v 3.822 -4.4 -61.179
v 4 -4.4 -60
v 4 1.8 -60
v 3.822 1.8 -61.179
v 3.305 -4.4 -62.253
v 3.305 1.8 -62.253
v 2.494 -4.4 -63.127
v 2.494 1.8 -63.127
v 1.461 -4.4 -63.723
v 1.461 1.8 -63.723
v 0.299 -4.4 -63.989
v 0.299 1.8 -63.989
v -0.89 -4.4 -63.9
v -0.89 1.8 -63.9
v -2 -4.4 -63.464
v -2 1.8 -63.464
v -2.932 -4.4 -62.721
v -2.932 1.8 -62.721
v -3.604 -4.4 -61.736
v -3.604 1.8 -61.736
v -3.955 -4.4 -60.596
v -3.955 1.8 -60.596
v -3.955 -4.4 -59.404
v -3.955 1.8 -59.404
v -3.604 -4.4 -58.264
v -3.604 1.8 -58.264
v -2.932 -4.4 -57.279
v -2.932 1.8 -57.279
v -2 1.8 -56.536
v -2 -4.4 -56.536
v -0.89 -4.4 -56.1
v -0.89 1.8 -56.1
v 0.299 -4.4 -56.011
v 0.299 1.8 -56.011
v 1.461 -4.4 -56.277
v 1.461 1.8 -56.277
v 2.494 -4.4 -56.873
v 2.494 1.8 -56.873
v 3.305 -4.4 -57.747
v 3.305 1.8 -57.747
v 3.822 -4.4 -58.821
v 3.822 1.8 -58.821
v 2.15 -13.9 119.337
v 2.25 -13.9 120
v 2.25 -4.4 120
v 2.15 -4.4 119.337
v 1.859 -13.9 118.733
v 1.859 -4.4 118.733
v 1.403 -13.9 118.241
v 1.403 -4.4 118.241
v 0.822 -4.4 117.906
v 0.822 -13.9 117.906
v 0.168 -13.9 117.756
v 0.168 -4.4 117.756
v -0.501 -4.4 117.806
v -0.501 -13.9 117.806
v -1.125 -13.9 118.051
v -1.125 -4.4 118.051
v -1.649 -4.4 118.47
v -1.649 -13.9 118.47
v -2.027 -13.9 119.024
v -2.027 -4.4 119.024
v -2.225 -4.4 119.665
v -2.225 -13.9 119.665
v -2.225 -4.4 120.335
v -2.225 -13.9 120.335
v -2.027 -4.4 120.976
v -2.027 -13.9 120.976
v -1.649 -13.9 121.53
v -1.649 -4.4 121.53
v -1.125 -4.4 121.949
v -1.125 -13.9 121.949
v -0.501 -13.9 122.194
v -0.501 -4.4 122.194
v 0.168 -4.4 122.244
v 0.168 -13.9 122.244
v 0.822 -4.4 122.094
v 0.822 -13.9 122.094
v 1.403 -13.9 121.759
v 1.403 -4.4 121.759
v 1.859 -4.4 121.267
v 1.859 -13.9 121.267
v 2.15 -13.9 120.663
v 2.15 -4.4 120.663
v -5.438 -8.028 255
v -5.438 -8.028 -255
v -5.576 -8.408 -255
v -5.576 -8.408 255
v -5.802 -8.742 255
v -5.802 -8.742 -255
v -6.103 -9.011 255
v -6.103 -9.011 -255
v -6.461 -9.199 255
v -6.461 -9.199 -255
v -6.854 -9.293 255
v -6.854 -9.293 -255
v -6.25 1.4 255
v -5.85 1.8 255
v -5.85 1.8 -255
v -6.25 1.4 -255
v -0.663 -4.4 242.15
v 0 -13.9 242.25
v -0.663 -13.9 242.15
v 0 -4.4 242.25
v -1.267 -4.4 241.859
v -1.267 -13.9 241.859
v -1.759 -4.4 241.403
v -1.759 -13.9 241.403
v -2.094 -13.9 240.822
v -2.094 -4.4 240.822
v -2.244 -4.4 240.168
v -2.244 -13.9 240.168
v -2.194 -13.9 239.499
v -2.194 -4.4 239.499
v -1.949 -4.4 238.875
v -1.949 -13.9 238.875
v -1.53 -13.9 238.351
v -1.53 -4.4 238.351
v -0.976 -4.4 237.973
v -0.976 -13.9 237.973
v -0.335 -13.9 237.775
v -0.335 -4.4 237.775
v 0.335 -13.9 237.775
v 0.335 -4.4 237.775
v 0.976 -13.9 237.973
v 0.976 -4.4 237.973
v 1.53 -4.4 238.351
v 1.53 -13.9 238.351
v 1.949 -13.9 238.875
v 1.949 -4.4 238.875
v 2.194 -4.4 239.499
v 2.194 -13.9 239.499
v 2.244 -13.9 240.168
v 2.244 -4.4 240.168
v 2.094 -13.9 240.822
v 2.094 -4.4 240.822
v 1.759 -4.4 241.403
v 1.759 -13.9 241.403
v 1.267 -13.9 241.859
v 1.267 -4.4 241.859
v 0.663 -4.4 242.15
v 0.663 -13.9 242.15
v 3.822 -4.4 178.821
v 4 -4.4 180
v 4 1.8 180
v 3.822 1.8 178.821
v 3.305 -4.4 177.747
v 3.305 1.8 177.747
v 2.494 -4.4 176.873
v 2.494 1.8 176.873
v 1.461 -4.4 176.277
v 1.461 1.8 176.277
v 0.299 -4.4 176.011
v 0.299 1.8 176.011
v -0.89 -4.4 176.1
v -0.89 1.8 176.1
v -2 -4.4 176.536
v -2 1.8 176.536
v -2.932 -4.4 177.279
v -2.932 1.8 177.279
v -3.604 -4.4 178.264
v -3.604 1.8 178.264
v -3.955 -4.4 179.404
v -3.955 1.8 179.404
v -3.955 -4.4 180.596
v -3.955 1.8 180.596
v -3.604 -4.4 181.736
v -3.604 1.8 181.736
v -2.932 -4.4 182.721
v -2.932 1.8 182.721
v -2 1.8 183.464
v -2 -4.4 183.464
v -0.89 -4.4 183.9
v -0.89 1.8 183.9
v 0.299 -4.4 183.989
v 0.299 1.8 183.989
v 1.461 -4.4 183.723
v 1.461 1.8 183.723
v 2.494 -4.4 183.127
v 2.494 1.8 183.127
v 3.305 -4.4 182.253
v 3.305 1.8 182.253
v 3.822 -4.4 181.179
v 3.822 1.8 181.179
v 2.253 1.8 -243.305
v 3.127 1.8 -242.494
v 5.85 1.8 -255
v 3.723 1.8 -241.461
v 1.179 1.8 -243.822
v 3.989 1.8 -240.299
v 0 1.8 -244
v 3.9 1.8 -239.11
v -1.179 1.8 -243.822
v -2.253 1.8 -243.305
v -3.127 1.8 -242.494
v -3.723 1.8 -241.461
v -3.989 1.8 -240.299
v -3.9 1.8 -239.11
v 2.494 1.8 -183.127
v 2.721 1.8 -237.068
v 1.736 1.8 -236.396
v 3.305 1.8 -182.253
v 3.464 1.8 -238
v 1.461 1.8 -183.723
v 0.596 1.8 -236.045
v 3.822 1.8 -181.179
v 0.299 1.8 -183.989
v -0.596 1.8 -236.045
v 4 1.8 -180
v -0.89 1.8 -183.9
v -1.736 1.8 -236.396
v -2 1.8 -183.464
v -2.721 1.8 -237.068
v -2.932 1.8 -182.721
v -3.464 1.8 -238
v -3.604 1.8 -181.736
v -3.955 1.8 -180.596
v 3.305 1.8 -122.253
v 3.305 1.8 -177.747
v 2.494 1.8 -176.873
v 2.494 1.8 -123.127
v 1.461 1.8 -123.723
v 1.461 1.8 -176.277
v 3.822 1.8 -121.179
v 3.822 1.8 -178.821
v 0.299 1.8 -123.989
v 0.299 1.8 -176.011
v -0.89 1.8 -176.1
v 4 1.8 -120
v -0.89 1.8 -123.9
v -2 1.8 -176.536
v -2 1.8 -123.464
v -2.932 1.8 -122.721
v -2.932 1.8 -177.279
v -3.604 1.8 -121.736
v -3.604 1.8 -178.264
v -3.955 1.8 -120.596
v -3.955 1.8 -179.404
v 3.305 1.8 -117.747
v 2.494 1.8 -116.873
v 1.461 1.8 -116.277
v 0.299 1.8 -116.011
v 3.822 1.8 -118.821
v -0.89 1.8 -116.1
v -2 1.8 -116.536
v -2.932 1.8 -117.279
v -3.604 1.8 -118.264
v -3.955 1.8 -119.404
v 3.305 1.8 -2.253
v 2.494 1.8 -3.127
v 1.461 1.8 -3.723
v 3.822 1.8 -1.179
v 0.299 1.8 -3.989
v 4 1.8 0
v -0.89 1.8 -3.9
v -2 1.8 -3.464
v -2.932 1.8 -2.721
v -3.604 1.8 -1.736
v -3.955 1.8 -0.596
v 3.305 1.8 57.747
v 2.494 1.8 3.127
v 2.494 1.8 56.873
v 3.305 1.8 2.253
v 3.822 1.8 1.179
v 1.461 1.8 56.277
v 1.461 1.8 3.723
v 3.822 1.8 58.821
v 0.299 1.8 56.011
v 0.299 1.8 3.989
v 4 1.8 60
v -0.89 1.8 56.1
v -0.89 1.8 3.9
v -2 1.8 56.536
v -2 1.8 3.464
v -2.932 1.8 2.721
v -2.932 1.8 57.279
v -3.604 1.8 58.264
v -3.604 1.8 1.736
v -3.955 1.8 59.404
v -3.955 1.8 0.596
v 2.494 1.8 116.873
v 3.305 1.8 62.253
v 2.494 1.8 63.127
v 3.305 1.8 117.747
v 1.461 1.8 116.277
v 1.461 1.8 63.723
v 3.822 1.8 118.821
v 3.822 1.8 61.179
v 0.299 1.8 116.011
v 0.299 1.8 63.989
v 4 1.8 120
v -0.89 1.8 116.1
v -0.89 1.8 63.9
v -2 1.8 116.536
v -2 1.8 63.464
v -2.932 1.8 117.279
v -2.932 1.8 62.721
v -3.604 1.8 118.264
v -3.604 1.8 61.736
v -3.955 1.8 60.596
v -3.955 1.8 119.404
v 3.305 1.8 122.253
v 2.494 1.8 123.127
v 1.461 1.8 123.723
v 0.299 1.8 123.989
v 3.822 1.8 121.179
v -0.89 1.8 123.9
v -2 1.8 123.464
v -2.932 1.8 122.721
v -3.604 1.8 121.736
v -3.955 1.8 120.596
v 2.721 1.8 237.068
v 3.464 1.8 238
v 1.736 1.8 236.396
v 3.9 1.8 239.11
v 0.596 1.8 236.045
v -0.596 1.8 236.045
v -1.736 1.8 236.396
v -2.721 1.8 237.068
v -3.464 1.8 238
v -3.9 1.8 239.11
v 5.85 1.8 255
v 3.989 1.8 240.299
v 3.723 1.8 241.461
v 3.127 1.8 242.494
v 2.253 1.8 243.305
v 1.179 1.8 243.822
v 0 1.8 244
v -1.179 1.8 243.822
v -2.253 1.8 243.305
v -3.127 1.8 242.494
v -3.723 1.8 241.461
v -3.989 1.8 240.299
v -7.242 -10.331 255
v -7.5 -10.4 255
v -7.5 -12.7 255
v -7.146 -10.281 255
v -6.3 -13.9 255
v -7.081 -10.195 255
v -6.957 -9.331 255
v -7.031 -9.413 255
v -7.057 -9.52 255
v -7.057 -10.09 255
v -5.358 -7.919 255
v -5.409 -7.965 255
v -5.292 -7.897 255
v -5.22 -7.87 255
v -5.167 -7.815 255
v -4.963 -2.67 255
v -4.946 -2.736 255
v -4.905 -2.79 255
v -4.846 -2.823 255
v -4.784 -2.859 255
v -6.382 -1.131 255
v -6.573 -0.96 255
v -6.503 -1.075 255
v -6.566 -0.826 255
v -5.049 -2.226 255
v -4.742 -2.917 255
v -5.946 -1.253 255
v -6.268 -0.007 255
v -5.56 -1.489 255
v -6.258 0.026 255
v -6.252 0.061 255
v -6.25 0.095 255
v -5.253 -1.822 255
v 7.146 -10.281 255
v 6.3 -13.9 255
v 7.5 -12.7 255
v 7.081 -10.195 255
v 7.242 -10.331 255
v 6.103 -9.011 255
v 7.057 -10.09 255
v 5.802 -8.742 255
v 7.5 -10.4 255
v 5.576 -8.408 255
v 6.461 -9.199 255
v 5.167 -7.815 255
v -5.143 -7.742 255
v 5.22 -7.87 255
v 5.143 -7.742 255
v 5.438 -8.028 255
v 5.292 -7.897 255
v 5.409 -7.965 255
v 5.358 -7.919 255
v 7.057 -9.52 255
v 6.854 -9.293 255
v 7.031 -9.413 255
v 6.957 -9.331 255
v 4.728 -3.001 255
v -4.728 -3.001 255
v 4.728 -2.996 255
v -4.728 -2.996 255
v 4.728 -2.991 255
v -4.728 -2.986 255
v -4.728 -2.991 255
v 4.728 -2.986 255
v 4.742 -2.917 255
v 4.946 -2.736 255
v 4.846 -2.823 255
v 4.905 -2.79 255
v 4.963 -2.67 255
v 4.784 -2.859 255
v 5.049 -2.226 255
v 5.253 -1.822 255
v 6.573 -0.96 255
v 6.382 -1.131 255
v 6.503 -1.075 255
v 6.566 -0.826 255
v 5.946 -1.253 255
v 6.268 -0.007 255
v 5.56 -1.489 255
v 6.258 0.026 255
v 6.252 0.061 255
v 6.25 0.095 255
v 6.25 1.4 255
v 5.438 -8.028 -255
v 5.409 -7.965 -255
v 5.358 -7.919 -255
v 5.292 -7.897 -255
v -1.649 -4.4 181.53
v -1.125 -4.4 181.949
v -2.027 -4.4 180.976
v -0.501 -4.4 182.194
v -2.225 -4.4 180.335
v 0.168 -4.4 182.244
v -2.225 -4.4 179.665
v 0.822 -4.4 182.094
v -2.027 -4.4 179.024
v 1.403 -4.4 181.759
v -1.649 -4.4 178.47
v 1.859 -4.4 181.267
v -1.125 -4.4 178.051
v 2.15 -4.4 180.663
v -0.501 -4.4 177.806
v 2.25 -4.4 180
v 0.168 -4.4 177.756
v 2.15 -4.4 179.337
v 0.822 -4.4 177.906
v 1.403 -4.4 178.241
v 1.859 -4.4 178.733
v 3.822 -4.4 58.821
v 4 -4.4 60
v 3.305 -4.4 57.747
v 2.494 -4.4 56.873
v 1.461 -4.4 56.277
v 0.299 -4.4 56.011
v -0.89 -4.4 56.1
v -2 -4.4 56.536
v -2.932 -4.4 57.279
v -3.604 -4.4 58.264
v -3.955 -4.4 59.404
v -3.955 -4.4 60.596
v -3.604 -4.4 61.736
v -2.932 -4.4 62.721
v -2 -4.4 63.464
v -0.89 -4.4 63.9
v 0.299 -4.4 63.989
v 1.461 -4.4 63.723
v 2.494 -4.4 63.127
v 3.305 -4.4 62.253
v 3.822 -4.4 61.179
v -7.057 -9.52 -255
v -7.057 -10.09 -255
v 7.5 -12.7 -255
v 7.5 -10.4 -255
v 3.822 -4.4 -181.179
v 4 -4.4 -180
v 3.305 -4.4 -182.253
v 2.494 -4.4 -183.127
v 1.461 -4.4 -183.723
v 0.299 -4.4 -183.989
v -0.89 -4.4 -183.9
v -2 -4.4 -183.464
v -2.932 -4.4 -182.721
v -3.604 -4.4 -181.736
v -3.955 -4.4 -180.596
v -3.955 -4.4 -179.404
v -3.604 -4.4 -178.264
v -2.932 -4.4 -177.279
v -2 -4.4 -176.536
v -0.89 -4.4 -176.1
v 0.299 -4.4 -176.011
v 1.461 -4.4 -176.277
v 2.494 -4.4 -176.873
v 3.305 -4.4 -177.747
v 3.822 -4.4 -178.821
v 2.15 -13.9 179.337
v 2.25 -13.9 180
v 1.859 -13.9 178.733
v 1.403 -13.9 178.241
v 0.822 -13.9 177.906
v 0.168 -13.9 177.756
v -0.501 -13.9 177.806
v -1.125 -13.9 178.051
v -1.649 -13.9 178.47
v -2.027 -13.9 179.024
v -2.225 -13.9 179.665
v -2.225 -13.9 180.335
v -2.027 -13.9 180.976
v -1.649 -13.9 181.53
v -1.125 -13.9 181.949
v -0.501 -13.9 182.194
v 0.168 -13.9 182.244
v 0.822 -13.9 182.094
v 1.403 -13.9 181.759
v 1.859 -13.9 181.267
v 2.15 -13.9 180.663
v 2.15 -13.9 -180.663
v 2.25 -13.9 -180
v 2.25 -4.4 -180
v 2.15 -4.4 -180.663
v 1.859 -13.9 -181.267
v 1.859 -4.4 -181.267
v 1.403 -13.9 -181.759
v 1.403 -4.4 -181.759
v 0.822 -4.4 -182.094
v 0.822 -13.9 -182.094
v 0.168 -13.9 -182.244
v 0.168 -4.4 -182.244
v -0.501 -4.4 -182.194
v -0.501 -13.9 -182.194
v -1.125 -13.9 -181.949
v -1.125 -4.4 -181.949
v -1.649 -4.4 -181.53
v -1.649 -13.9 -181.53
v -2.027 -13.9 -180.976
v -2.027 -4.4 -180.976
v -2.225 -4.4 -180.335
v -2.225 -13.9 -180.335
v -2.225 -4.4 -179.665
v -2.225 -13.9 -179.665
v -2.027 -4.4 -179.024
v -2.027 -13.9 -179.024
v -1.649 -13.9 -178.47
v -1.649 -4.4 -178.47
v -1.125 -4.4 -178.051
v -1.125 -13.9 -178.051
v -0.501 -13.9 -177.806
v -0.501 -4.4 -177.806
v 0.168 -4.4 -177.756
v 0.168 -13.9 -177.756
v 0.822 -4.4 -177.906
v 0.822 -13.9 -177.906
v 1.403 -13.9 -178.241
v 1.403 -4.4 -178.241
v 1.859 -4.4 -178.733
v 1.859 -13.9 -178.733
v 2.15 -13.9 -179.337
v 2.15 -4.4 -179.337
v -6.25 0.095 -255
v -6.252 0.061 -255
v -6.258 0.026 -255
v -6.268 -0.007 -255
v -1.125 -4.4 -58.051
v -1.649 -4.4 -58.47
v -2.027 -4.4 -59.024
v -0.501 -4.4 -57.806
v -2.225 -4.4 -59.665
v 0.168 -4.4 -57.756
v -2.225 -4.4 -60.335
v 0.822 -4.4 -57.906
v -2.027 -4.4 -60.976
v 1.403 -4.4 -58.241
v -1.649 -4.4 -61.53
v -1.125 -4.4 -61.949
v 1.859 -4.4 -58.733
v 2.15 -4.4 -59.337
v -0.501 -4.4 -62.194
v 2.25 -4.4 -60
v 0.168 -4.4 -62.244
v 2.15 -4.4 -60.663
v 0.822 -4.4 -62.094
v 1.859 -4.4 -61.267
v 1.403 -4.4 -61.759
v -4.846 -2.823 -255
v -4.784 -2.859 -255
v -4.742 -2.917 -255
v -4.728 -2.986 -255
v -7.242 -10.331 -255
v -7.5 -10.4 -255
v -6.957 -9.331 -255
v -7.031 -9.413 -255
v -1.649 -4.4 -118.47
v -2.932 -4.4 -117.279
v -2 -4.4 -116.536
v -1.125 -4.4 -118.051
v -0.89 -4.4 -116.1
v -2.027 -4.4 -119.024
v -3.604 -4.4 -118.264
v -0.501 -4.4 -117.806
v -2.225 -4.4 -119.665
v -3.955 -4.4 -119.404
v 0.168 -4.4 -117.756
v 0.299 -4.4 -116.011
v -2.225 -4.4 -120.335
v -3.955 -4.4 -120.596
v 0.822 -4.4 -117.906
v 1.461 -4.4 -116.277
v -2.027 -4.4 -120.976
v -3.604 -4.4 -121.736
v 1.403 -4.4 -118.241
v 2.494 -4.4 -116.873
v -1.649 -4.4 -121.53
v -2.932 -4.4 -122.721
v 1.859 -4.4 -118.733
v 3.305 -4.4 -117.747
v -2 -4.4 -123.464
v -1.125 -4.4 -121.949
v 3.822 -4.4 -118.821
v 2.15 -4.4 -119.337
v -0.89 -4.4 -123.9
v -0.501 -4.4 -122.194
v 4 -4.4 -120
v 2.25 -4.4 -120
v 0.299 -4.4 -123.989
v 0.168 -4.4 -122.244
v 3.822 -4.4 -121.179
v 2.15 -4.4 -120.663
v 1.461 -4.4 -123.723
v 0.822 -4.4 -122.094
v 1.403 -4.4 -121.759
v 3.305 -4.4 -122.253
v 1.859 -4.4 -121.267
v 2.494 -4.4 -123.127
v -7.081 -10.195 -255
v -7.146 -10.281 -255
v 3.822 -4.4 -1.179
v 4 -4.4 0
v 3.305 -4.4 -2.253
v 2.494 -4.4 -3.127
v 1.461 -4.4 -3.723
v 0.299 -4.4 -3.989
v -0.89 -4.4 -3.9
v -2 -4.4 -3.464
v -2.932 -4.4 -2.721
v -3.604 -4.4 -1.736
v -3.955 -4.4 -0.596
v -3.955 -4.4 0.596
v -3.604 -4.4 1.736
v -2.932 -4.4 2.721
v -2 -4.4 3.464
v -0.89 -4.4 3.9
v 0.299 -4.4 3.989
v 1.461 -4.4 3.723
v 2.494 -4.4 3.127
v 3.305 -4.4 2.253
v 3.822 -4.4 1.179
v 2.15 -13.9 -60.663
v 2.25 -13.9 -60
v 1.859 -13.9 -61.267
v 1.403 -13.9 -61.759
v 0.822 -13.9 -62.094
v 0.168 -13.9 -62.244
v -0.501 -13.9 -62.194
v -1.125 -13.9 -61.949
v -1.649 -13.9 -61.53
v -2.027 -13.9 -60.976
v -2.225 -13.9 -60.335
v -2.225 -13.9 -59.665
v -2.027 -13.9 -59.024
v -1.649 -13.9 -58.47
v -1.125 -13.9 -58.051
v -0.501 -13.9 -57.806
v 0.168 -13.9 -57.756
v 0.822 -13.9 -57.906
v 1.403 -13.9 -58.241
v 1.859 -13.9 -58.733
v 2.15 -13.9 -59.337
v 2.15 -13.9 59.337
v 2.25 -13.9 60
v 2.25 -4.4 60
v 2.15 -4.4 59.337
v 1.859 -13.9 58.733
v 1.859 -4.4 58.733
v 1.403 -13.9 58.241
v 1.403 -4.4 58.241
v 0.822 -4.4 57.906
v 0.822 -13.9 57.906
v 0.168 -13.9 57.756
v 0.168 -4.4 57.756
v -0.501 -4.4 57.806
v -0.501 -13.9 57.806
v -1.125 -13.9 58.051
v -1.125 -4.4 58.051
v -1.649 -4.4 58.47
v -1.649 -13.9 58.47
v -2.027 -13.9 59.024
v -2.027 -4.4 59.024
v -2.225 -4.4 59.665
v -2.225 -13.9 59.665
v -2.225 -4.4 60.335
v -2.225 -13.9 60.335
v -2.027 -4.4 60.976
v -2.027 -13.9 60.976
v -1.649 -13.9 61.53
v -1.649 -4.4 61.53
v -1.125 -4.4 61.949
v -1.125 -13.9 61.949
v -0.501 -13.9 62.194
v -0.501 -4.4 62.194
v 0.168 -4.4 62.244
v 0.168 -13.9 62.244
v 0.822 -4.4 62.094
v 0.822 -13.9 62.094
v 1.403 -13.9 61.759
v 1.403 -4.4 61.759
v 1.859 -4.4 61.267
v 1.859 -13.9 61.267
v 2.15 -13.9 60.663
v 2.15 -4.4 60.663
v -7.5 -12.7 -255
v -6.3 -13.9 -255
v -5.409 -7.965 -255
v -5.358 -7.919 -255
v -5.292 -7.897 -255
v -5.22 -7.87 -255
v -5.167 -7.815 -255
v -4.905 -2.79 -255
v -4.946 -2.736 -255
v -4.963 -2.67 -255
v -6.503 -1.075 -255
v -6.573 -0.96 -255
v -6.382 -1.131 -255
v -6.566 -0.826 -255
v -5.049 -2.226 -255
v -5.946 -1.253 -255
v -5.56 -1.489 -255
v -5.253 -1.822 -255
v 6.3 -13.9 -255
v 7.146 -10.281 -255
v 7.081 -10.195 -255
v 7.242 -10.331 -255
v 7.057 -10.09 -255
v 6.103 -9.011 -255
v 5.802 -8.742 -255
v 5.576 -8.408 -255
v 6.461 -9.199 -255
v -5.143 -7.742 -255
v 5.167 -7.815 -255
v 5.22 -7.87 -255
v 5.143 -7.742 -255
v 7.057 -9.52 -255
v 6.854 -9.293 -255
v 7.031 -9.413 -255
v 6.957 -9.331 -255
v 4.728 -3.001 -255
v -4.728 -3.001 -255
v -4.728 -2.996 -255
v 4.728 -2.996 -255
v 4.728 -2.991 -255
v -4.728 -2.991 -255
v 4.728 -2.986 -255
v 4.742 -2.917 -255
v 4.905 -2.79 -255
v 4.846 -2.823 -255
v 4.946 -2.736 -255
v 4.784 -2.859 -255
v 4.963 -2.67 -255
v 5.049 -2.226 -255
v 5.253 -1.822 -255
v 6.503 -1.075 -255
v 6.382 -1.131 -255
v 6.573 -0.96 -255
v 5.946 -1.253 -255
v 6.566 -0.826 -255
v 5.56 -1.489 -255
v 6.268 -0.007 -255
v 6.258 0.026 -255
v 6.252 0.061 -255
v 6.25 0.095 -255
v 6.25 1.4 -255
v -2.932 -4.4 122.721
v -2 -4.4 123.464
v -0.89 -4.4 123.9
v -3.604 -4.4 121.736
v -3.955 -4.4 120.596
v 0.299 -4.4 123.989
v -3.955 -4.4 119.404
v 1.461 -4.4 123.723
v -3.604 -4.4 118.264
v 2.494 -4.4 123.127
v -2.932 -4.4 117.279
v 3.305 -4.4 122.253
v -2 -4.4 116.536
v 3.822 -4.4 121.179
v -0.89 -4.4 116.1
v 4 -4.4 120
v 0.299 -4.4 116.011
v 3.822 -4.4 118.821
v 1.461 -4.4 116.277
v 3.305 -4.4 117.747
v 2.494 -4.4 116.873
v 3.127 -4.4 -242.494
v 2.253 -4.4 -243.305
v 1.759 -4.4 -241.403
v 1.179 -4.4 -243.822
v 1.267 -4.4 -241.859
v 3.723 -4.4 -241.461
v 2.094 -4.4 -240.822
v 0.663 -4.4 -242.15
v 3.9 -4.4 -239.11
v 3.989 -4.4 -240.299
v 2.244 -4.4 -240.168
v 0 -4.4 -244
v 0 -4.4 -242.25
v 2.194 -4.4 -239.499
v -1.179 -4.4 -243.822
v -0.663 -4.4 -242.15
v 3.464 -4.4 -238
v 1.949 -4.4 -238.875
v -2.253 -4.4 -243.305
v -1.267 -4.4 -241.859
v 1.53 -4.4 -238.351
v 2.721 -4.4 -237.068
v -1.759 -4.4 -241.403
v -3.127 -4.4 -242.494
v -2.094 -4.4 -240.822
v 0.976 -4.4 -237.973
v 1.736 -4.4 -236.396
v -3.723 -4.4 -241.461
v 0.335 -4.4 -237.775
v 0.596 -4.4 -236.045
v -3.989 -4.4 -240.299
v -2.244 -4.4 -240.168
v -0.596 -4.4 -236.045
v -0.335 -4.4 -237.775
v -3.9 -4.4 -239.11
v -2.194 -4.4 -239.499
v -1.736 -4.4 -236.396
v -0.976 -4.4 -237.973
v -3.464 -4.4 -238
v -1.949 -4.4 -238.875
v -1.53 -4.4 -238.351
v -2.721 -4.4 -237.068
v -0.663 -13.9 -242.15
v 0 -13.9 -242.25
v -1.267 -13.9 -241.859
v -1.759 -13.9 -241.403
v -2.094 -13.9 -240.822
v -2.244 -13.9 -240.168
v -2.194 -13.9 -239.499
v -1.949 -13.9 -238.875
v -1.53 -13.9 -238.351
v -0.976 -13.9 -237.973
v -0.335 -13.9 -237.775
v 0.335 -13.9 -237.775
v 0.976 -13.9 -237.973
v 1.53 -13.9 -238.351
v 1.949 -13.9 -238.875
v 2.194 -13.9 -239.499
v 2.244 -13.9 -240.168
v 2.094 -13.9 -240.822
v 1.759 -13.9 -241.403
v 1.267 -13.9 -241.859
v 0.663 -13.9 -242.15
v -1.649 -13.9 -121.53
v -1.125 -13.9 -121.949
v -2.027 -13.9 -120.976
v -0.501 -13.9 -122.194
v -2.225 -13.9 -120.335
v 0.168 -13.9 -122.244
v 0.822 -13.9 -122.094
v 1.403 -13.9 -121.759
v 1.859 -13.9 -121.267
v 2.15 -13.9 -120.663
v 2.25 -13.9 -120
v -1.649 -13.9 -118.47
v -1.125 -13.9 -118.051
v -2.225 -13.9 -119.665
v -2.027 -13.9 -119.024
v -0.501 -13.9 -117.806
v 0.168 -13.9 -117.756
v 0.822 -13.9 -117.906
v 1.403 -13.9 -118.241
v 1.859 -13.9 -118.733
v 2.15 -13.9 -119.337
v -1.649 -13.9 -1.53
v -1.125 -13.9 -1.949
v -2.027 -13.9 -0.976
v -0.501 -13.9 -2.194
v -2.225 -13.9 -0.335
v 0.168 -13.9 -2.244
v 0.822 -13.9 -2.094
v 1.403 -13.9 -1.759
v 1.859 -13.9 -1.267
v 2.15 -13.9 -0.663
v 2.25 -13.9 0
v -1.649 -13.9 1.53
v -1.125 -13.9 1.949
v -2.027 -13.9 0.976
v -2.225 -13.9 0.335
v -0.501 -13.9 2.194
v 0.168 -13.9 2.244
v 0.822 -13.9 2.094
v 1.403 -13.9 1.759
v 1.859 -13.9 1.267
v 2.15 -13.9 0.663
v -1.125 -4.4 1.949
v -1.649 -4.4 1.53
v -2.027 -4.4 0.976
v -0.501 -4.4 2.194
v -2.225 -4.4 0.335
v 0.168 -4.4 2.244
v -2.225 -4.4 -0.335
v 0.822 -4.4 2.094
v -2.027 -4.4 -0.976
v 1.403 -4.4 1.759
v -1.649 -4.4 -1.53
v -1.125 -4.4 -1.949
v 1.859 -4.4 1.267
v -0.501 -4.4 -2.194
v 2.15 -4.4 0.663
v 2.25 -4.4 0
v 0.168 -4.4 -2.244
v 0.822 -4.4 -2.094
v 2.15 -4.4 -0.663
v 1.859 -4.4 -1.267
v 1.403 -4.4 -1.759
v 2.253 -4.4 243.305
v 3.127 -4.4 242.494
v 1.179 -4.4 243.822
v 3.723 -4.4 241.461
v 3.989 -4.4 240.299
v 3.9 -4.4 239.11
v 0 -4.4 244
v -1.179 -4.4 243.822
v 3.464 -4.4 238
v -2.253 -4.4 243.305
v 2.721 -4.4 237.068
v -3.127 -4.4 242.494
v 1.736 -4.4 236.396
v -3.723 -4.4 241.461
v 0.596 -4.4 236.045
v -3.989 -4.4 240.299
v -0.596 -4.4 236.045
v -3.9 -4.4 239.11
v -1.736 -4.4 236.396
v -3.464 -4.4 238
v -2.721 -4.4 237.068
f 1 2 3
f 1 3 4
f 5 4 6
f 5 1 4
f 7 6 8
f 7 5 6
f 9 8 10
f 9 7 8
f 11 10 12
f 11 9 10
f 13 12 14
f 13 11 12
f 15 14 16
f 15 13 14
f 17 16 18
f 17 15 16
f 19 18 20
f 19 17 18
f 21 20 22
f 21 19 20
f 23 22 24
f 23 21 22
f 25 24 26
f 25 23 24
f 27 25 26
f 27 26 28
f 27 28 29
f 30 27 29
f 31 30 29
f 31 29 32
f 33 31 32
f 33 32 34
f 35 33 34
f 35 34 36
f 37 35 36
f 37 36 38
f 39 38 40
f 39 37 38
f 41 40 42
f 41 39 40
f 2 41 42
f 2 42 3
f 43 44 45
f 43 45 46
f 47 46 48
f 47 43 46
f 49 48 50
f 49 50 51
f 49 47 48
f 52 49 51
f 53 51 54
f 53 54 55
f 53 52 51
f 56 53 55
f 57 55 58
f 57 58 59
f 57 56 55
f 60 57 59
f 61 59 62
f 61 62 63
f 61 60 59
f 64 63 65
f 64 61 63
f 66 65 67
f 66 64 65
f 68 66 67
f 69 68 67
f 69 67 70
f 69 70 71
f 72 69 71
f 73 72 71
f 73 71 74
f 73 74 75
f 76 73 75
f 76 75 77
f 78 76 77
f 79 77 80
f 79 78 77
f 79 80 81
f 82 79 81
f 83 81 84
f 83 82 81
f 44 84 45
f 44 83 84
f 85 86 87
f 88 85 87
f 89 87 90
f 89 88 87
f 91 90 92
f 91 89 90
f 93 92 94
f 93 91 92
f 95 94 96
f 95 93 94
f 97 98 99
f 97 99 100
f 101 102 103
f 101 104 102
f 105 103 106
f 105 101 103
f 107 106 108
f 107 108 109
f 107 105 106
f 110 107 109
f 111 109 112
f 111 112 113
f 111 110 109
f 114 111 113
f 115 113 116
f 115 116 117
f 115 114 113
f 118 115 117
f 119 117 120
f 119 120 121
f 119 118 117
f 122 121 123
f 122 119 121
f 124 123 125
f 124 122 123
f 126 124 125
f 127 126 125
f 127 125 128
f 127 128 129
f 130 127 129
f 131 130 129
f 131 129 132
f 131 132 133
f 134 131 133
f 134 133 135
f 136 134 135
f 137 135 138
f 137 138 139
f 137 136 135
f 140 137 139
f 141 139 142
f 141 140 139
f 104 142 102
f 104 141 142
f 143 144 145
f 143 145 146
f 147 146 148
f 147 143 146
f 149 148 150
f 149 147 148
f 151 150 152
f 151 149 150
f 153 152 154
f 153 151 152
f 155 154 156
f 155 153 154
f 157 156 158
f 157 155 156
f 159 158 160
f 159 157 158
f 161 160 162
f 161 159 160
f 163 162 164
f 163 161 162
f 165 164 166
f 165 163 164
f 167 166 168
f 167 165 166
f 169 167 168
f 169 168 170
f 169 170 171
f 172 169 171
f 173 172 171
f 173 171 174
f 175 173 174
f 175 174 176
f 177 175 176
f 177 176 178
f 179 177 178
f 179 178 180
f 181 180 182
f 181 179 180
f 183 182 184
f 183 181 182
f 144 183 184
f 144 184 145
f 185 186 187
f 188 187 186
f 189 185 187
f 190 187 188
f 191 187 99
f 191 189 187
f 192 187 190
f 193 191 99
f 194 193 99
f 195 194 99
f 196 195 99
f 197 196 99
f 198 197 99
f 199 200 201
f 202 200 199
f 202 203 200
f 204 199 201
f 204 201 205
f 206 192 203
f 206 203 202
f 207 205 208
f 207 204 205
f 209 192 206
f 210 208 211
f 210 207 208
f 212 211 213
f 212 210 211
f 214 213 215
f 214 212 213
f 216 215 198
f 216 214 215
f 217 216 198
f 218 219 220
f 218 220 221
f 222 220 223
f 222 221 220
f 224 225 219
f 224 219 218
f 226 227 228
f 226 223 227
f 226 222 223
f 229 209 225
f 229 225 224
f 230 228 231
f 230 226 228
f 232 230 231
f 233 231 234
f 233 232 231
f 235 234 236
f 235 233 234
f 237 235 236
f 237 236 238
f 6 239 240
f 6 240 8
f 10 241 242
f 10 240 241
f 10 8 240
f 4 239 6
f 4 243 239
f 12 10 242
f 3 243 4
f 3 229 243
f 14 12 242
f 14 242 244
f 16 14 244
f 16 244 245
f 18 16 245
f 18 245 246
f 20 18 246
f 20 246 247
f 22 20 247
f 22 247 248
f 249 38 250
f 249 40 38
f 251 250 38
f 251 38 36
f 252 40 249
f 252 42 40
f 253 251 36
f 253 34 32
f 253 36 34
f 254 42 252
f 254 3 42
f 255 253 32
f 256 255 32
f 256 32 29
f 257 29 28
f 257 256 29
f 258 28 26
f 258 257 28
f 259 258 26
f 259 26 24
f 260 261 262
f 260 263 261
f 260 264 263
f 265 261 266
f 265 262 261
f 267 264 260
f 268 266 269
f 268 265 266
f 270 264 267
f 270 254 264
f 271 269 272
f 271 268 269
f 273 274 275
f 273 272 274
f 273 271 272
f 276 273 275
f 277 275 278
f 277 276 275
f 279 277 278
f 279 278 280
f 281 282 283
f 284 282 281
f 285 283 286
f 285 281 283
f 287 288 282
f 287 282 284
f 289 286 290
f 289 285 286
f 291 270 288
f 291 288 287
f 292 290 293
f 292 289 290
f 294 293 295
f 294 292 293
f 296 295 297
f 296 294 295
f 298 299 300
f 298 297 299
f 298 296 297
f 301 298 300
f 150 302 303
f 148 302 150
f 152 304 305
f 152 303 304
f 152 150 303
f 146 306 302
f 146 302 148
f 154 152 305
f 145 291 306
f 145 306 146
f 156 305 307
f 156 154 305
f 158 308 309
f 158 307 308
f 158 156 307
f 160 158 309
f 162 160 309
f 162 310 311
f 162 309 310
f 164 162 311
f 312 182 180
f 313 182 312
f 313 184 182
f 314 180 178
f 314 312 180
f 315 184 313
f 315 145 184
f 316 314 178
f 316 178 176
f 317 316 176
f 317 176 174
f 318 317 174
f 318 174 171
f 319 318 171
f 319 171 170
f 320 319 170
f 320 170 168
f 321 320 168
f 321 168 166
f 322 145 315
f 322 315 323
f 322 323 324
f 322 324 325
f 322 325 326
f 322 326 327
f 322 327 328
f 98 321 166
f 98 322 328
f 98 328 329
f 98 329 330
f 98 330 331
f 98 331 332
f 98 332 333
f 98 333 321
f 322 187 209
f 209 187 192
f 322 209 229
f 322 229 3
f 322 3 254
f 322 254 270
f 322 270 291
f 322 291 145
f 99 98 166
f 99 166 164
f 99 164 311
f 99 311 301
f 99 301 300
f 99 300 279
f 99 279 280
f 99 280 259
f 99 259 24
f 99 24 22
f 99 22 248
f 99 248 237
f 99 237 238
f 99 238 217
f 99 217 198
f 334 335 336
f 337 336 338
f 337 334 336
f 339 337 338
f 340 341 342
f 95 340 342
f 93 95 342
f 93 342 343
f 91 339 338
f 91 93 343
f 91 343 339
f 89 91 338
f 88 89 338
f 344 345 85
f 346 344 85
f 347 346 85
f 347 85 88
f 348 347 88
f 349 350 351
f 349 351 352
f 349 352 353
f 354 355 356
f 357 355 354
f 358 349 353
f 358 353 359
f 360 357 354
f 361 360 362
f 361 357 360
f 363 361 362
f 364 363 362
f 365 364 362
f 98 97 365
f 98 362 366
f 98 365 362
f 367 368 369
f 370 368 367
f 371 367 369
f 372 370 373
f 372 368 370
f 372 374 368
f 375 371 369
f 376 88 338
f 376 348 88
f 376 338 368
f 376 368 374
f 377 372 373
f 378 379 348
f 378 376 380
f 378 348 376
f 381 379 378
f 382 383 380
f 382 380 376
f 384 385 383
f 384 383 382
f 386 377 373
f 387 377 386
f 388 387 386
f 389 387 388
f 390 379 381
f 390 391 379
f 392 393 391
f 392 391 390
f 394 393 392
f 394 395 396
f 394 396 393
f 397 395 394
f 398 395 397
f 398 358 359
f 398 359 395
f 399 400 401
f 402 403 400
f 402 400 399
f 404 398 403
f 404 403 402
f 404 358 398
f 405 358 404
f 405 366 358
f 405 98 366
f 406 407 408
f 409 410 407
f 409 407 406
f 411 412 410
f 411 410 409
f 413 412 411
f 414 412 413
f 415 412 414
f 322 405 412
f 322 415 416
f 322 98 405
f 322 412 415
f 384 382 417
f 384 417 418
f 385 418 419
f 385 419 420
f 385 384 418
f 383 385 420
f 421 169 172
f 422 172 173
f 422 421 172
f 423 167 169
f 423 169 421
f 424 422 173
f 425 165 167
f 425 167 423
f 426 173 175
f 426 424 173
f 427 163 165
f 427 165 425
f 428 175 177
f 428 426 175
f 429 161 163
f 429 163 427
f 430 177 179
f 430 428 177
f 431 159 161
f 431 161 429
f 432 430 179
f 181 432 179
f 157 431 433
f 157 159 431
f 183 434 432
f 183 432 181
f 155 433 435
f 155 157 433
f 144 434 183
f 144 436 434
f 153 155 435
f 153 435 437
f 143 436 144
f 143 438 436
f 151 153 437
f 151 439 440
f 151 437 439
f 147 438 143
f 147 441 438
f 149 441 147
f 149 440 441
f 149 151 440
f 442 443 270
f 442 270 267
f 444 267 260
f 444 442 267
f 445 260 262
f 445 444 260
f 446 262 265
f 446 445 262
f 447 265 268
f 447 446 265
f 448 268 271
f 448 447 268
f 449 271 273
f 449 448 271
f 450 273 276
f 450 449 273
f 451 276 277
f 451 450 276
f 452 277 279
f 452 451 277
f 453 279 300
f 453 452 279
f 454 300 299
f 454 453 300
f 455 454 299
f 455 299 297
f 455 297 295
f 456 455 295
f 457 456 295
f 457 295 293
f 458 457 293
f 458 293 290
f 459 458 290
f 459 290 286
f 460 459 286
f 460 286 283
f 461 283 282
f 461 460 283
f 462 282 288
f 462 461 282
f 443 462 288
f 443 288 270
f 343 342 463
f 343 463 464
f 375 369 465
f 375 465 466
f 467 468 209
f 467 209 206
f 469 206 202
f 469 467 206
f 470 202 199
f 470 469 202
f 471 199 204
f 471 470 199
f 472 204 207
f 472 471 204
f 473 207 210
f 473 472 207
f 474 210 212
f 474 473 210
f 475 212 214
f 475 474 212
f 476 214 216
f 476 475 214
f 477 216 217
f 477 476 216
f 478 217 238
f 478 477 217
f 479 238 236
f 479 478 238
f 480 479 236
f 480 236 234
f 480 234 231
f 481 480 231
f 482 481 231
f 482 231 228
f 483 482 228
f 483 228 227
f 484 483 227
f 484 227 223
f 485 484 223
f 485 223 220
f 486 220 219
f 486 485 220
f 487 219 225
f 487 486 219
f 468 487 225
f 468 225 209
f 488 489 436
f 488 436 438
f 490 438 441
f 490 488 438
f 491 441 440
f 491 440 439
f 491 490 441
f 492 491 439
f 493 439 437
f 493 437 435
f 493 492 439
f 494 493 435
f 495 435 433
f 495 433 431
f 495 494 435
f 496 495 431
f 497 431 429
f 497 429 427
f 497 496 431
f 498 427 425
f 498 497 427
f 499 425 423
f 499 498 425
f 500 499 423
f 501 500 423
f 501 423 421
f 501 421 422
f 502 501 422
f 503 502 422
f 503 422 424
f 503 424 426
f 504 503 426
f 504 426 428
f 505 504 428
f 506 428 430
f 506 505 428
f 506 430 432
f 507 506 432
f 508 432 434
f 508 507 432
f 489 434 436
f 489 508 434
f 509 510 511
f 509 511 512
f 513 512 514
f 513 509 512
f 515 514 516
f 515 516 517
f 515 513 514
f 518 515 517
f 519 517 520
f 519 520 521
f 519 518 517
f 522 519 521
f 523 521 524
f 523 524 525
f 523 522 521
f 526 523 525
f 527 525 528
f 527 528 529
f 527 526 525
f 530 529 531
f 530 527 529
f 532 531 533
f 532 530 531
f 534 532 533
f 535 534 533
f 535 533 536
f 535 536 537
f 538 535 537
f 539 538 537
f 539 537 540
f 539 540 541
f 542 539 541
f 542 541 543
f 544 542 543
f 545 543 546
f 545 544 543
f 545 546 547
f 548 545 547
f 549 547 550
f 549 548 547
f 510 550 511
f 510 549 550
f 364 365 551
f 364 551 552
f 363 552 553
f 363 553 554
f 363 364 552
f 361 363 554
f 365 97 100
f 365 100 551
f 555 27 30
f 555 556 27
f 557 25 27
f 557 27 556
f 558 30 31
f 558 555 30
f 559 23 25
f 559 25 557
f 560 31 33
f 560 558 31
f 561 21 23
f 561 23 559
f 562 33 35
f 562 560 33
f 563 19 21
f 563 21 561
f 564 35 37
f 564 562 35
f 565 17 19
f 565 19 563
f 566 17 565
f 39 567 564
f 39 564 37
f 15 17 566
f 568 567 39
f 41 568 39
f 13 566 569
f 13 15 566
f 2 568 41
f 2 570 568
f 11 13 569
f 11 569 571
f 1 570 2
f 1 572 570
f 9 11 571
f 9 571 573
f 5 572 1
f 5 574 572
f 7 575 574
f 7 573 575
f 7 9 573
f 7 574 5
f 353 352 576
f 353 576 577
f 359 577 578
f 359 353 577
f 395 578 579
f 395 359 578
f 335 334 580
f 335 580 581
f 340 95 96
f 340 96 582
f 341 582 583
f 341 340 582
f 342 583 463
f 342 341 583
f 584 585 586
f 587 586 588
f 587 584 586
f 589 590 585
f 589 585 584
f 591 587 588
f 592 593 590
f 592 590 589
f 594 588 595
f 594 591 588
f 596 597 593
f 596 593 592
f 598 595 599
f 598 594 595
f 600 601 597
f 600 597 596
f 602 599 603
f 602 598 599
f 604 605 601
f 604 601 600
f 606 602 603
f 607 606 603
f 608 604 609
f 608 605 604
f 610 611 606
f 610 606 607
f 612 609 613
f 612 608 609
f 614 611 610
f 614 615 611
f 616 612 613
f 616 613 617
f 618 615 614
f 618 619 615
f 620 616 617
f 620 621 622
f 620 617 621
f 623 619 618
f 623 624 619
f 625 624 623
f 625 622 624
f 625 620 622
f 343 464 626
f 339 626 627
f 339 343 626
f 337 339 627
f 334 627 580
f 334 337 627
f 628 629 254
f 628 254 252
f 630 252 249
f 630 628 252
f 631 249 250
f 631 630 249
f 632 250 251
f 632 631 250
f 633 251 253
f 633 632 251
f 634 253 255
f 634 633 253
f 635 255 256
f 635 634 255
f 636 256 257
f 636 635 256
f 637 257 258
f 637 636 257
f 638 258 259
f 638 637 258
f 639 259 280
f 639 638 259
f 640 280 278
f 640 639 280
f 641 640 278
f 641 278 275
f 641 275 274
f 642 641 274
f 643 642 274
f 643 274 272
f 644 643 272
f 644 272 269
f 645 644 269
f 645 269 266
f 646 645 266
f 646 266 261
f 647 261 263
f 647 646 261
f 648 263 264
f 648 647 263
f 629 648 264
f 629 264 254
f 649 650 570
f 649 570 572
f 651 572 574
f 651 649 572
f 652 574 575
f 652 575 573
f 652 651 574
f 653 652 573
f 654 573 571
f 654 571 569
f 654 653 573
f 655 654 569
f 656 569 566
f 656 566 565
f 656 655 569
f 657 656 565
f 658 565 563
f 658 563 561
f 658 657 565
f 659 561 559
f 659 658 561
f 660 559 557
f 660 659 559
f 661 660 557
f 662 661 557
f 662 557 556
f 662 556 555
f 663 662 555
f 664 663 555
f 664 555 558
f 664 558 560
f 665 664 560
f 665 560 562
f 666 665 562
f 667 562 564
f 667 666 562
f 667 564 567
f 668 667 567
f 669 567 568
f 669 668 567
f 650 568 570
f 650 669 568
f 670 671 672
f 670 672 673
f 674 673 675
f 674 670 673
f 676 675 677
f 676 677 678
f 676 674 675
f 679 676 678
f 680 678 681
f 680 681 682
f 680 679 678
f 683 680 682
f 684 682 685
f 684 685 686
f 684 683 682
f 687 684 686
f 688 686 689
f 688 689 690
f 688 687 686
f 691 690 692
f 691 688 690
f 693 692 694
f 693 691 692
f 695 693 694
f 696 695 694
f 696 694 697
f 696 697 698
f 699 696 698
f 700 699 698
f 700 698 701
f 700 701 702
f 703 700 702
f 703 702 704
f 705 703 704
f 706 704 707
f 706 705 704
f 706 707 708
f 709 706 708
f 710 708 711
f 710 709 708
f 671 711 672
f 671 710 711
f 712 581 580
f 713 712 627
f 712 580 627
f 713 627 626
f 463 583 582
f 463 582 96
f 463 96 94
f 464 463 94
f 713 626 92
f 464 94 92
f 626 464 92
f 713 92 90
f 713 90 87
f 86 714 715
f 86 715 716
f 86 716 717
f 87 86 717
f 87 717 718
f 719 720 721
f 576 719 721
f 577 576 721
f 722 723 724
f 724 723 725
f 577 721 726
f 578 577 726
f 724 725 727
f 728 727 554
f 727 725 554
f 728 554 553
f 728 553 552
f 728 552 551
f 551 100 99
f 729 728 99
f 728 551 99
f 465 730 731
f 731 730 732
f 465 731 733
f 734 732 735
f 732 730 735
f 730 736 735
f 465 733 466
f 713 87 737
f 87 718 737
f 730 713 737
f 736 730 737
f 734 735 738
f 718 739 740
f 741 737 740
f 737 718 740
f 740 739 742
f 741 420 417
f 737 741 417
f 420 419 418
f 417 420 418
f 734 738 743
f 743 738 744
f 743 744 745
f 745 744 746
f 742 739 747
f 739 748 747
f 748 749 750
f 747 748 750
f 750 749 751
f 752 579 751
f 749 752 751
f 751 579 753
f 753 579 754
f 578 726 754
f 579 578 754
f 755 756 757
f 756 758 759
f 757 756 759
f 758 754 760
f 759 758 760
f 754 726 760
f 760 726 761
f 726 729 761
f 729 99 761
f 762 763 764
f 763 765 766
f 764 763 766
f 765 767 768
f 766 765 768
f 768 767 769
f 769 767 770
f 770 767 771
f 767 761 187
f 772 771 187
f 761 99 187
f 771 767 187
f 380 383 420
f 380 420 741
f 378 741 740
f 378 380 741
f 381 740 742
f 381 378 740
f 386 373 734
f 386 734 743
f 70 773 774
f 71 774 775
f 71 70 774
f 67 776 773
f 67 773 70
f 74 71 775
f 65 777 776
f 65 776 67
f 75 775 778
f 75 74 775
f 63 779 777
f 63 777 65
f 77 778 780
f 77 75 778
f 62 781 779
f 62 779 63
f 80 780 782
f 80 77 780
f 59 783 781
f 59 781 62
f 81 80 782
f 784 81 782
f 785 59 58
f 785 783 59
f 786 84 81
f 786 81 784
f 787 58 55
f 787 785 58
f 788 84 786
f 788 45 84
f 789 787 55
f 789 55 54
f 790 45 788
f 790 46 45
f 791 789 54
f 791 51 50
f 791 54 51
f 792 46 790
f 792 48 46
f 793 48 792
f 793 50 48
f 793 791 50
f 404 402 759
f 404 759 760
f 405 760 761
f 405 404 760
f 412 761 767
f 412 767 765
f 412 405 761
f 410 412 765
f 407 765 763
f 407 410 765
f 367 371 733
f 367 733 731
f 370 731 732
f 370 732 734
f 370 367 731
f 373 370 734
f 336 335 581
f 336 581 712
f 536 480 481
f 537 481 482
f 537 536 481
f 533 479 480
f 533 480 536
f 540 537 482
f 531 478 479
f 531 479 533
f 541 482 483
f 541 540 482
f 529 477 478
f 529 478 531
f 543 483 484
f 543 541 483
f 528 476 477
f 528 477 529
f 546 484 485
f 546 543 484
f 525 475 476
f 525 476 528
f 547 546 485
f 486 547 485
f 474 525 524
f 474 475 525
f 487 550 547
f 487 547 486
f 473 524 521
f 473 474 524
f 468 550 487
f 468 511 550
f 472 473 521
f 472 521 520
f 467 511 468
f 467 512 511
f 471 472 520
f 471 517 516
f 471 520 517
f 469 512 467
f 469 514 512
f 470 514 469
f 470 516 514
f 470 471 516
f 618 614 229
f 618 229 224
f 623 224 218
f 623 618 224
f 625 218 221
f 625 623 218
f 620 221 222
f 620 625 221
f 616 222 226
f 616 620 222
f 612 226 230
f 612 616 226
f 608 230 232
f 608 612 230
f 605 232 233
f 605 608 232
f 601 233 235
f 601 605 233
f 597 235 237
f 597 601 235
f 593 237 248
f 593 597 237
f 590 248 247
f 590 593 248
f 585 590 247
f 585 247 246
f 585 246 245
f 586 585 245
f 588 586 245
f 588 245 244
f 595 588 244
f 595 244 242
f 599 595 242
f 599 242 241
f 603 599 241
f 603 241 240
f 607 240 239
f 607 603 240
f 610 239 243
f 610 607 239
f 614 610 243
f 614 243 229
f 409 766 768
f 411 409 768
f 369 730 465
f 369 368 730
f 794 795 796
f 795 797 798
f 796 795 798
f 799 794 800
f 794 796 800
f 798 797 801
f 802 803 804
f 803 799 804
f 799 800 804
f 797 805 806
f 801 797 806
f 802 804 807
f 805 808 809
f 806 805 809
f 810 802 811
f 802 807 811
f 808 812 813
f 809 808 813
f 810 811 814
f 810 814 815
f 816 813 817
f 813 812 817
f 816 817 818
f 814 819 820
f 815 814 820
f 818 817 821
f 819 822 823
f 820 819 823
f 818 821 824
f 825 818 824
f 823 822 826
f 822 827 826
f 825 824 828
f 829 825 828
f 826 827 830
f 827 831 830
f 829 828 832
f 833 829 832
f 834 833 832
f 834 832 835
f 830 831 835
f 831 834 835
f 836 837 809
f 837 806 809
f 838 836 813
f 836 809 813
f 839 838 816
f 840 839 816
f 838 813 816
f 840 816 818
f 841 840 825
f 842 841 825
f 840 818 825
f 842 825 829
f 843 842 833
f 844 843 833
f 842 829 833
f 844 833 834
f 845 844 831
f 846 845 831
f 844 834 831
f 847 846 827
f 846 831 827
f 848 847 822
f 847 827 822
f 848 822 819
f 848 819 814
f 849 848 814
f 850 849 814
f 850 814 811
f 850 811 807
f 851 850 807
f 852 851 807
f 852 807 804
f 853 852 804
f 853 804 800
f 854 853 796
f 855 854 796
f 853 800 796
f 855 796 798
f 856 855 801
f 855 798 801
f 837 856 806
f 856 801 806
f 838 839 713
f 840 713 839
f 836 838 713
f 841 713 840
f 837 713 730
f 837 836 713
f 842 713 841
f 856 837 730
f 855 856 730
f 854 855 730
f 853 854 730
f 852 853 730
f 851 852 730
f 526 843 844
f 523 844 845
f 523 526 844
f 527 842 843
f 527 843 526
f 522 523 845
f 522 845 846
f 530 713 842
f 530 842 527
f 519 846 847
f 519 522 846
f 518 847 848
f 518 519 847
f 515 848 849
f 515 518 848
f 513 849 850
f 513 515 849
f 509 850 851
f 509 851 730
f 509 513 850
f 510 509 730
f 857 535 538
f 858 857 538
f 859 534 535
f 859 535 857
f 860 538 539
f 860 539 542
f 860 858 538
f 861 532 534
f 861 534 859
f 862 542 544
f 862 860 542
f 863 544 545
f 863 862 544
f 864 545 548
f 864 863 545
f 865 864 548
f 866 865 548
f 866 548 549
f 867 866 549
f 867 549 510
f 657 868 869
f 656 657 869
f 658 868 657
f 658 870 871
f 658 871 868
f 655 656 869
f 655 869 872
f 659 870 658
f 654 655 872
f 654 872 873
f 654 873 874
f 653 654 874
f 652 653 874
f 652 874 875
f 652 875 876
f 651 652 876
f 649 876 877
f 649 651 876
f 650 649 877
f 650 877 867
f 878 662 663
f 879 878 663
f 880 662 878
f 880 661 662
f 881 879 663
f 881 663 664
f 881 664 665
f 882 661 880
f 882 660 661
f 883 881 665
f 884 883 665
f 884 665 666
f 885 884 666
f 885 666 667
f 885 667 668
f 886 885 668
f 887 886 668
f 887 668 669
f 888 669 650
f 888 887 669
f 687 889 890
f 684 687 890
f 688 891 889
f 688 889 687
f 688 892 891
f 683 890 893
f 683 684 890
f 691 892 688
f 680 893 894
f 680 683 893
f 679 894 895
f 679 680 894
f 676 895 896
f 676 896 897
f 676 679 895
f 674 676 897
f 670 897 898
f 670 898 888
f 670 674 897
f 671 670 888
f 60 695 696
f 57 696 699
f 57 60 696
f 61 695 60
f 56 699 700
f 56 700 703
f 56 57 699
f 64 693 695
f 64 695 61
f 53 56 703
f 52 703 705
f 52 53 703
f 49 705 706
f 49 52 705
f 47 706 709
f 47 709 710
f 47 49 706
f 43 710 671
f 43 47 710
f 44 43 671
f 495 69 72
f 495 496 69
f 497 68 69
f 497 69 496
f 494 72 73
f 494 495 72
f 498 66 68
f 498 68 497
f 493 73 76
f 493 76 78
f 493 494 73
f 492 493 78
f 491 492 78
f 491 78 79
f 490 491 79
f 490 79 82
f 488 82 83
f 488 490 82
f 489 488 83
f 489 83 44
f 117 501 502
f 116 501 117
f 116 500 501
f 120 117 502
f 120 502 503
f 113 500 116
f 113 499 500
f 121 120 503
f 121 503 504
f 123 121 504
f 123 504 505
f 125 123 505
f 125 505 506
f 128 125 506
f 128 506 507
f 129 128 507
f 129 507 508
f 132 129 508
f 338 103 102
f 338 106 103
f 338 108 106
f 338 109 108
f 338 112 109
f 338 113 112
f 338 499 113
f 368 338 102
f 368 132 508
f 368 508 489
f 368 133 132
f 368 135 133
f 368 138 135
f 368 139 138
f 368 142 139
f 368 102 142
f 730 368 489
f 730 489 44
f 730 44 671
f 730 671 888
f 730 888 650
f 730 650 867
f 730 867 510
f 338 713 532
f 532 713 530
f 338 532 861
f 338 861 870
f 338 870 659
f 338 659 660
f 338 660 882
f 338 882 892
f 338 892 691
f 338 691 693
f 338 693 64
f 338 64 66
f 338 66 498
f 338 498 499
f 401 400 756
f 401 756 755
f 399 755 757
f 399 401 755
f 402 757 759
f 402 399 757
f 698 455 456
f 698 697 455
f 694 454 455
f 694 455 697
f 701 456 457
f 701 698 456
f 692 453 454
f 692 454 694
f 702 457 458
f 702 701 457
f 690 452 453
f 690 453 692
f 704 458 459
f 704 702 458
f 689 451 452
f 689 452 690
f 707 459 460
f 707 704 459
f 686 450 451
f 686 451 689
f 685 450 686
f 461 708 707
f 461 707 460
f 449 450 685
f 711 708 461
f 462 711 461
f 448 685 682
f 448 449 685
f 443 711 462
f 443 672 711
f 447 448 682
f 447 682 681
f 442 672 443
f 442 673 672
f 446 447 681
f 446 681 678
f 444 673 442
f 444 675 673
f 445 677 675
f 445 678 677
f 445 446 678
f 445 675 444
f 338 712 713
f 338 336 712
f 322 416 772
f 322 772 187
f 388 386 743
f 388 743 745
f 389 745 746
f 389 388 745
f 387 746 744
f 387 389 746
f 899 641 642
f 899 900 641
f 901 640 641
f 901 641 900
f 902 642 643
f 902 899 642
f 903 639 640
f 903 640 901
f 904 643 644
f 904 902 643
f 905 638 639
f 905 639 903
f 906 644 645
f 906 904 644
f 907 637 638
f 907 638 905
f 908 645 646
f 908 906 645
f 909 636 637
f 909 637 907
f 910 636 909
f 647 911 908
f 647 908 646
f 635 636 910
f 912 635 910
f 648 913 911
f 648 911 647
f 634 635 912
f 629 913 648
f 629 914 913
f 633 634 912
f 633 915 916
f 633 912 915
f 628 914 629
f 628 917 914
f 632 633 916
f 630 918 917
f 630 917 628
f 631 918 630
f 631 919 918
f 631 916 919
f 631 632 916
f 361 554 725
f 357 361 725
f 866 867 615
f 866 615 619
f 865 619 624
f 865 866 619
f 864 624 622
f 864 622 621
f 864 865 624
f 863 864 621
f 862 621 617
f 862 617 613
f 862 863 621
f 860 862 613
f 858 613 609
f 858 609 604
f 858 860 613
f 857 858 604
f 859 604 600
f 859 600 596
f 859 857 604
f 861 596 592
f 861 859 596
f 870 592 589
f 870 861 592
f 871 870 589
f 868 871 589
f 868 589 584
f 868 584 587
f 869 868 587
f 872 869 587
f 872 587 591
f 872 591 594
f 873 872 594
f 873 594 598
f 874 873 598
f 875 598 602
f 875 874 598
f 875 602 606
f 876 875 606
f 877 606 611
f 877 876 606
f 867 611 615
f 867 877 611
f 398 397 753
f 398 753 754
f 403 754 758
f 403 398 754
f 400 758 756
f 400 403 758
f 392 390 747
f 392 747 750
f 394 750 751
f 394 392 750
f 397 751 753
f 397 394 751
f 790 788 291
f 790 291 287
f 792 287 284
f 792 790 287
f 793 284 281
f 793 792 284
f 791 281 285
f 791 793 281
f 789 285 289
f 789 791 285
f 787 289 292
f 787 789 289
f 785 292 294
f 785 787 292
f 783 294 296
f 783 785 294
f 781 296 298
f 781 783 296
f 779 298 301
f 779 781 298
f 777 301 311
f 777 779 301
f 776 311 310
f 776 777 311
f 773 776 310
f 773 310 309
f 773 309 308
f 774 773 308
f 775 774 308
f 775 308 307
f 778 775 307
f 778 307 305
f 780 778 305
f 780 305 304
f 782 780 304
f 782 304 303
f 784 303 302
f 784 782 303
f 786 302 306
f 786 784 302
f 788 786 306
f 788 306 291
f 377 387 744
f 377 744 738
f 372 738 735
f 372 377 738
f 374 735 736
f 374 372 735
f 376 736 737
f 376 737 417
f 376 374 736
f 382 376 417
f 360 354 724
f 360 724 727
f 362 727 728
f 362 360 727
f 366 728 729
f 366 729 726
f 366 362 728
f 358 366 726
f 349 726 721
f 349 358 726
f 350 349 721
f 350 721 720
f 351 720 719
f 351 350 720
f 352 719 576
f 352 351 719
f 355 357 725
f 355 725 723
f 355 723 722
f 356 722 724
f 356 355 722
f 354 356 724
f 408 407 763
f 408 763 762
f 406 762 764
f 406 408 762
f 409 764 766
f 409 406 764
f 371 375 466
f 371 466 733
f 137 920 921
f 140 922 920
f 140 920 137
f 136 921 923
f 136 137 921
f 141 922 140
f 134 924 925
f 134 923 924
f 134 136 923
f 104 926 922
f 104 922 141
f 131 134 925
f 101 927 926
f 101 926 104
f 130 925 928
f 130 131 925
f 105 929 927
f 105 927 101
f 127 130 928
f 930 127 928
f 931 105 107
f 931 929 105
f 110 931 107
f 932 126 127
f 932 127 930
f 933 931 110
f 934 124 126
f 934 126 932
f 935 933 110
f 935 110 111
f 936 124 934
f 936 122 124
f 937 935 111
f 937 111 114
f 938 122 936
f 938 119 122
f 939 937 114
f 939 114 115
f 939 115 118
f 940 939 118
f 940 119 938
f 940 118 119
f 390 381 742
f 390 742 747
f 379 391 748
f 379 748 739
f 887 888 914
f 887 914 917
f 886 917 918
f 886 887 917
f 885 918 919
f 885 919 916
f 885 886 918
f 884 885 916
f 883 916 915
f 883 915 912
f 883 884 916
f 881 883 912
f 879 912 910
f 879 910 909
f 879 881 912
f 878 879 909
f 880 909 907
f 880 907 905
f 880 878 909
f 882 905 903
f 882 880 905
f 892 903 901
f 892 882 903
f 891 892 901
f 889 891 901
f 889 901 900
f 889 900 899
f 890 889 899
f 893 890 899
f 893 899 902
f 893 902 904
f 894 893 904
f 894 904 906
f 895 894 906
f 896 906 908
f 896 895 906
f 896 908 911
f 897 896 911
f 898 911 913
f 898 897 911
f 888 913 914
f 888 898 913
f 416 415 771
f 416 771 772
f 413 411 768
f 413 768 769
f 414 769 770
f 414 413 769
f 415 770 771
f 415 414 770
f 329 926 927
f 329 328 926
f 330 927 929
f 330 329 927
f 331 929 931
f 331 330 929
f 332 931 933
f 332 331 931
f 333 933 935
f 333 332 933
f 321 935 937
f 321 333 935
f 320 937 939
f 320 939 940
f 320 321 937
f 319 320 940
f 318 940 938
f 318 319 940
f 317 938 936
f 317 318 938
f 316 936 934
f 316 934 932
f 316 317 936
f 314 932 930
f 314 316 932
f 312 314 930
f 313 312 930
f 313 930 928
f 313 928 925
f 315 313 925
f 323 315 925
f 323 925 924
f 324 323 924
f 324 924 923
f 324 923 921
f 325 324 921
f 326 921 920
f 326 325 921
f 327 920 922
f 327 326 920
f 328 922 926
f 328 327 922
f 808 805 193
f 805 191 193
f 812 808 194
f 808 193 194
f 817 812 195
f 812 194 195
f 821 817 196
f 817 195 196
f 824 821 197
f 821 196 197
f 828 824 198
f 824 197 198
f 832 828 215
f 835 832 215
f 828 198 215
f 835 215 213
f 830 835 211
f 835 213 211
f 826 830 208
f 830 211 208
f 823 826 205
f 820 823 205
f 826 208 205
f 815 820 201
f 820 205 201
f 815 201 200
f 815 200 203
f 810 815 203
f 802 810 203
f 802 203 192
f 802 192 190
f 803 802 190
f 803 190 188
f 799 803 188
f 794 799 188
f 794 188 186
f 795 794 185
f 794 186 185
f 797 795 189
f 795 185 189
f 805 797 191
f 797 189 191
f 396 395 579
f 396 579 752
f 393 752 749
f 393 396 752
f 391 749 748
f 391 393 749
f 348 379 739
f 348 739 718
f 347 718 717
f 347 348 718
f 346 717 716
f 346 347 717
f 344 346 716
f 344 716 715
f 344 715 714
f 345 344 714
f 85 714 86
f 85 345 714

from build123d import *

# Parameters (mm, degrees)
EXTRUDE1_DEPTH        = 255
LPATTERN1_START       = -4.39999151
LPATTERN1_OUTLINE_R   = 4
LPATTERN1_DEPTH       = 6.200000002
LPATTERN1_START_2     = -13.89999151
LPATTERN1_2_OUTLINE_R = 2.25
LPATTERN1_2_DEPTH     = 9.5


# Read off the part's stored shape, not the designer's step: LPattern1
with BuildPart() as part:
    # Sketch1 → Extrude1 (new, symmetric)
    with BuildSketch(Plane.XY):
        with BuildLine():
            Line((6.299999998, -13.89999151), (7.499999673, -12.699991836))
            Line((7.499999673, -12.699991836), (7.499999673, -10.400043863))
            Line((7.499999673, -10.400043863), (7.242437811, -10.331030371))
            ThreePointArc((7.242437811, -10.331030371), (7.108804238, -10.241739271), (7.057142573, -10.089548914))
            Line((7.057142573, -10.089548914), (7.057142573, -9.520416543))
            ThreePointArc((7.057142573, -9.520416543), (6.998907475, -9.367837553), (6.853820755, -9.292860767))
            ThreePointArc((6.853820755, -9.292860767), (5.94454945, -8.885983146), (5.43815048, -8.028146455))
            ThreePointArc((5.43815048, -8.028146455), (5.386062423, -7.939367574), (5.292449295, -7.896572271))
            ThreePointArc((5.292449295, -7.896572271), (5.190381489, -7.845596795), (5.143092926, -7.7417694))
            Line((5.143092926, -7.7417694), (4.728320242, -3.00089593))
            ThreePointArc((4.728320242, -3.00089593), (4.727832289, -2.993451213), (4.727669535, -2.985992298))
            ThreePointArc((4.727669535, -2.985992298), (4.760267524, -2.885563799), (4.845633084, -2.823424974))
            ThreePointArc((4.845633084, -2.823424974), (4.928287775, -2.764919717), (4.963356305, -2.669920448))
            ThreePointArc((4.963356305, -2.669920448), (5.395229732, -1.644926655), (6.381524191, -1.130776701))
            ThreePointArc((6.381524191, -1.130776701), (6.54675572, -1.022271679), (6.565939633, -0.825531303))
            Line((6.565939633, -0.825531303), (6.268091886, -0.007201345))
            ThreePointArc((6.268091886, -0.007201345), (6.254557346, 0.043310245), (6.249999672, 0.095404698))
            Line((6.249999672, 0.095404698), (6.249999672, 1.399956135))
            Line((6.249999672, 1.399956135), (5.850000001, 1.800008492))
            Line((5.850000001, 1.800008492), (-5.849999998, 1.800008492))
            Line((-5.849999998, 1.800008492), (-6.24999967, 1.399956135))
            Line((-6.24999967, 1.399956135), (-6.24999967, 0.095404698))
            ThreePointArc((-6.24999967, 0.095404698), (-6.254557344, 0.043310245), (-6.268091883, -0.007201345))
            Line((-6.268091883, -0.007201345), (-6.56593963, -0.825531303))
            ThreePointArc((-6.56593963, -0.825531303), (-6.546755717, -1.022271679), (-6.381524188, -1.130776701))
            ThreePointArc((-6.381524188, -1.130776701), (-5.39522973, -1.644926655), (-4.963356302, -2.669920448))
            ThreePointArc((-4.963356302, -2.669920448), (-4.928287772, -2.764919717), (-4.845633081, -2.823424974))
            ThreePointArc((-4.845633081, -2.823424974), (-4.760267522, -2.885563799), (-4.727669532, -2.985992298))
            ThreePointArc((-4.727669532, -2.985992298), (-4.727832287, -2.993451213), (-4.728320239, -3.00089593))
            Line((-4.728320239, -3.00089593), (-5.143092923, -7.7417694))
            ThreePointArc((-5.143092923, -7.7417694), (-5.190381487, -7.845596795), (-5.292449292, -7.896572271))
            ThreePointArc((-5.292449292, -7.896572271), (-5.38606242, -7.939367574), (-5.438150478, -8.028146455))
            ThreePointArc((-5.438150478, -8.028146455), (-5.944549448, -8.885983146), (-6.853820752, -9.292860767))
            ThreePointArc((-6.853820752, -9.292860767), (-6.998907472, -9.367837553), (-7.05714257, -9.520416543))
            Line((-7.05714257, -9.520416543), (-7.05714257, -10.089548914))
            ThreePointArc((-7.05714257, -10.089548914), (-7.108804235, -10.241739271), (-7.242437809, -10.331030371))
            Line((-7.242437809, -10.331030371), (-7.49999967, -10.400043863))
            Line((-7.49999967, -10.400043863), (-7.49999967, -12.699991836))
            Line((-7.49999967, -12.699991836), (-6.299999996, -13.89999151))
            Line((-6.299999996, -13.89999151), (6.299999998, -13.89999151))
        make_face()
    extrude(amount=EXTRUDE1_DEPTH, both=True)

    # Sketch2 → Hole1 (revolve, cut)
    with BuildSketch(Plane(origin=(0, 1.800008492, 240), x_dir=(0, 0, 1), z_dir=(1, 0, 0))):
        Polygon((0, 0), (0, 17.051936395), (2.25, 15.700000002), (2.25, 6.200000002), (4, 6.200000002), (4, 0), align=None)
    hole1 = revolve(axis=Axis((0, 13.110883531, 240), (0, -1, 0)), mode=Mode.SUBTRACT)

    # LPattern1 outline → LPattern1 (cut)
    with BuildSketch(Plane(origin=(0, 0, 0), x_dir=(1, 0, 0), z_dir=(0, 1, 0)).offset(LPATTERN1_START)):
        with Locations((0, -180)):
            Circle(LPATTERN1_OUTLINE_R)
        with Locations((0, -120)):
            Circle(LPATTERN1_OUTLINE_R)
        with Locations((0, -60)):
            Circle(LPATTERN1_OUTLINE_R)
        Circle(LPATTERN1_OUTLINE_R)
        with Locations((0, 60)):
            Circle(LPATTERN1_OUTLINE_R)
        with Locations((0, 120)):
            Circle(LPATTERN1_OUTLINE_R)
        with Locations((0, 180)):
            Circle(LPATTERN1_OUTLINE_R)
    extrude(amount=LPATTERN1_DEPTH, mode=Mode.SUBTRACT)

    # LPattern1 2 outline → LPattern1 2 (cut)
    with BuildSketch(Plane(origin=(0, 0, 0), x_dir=(1, 0, 0), z_dir=(0, 1, 0)).offset(LPATTERN1_START_2)):
        with Locations((0, -180)):
            Circle(LPATTERN1_2_OUTLINE_R)
        with Locations((0, -120)):
            Circle(LPATTERN1_2_OUTLINE_R)
        with Locations((0, -60)):
            Circle(LPATTERN1_2_OUTLINE_R)
        Circle(LPATTERN1_2_OUTLINE_R)
        with Locations((0, 60)):
            Circle(LPATTERN1_2_OUTLINE_R)
        with Locations((0, 120)):
            Circle(LPATTERN1_2_OUTLINE_R)
        with Locations((0, 180)):
            Circle(LPATTERN1_2_OUTLINE_R)
    extrude(amount=LPATTERN1_2_DEPTH, mode=Mode.SUBTRACT)

    # A-Mirror1: Hole1 across plane
    add(hole1.mirror(Plane.XY), mode=Mode.SUBTRACT)


solid = part.part
